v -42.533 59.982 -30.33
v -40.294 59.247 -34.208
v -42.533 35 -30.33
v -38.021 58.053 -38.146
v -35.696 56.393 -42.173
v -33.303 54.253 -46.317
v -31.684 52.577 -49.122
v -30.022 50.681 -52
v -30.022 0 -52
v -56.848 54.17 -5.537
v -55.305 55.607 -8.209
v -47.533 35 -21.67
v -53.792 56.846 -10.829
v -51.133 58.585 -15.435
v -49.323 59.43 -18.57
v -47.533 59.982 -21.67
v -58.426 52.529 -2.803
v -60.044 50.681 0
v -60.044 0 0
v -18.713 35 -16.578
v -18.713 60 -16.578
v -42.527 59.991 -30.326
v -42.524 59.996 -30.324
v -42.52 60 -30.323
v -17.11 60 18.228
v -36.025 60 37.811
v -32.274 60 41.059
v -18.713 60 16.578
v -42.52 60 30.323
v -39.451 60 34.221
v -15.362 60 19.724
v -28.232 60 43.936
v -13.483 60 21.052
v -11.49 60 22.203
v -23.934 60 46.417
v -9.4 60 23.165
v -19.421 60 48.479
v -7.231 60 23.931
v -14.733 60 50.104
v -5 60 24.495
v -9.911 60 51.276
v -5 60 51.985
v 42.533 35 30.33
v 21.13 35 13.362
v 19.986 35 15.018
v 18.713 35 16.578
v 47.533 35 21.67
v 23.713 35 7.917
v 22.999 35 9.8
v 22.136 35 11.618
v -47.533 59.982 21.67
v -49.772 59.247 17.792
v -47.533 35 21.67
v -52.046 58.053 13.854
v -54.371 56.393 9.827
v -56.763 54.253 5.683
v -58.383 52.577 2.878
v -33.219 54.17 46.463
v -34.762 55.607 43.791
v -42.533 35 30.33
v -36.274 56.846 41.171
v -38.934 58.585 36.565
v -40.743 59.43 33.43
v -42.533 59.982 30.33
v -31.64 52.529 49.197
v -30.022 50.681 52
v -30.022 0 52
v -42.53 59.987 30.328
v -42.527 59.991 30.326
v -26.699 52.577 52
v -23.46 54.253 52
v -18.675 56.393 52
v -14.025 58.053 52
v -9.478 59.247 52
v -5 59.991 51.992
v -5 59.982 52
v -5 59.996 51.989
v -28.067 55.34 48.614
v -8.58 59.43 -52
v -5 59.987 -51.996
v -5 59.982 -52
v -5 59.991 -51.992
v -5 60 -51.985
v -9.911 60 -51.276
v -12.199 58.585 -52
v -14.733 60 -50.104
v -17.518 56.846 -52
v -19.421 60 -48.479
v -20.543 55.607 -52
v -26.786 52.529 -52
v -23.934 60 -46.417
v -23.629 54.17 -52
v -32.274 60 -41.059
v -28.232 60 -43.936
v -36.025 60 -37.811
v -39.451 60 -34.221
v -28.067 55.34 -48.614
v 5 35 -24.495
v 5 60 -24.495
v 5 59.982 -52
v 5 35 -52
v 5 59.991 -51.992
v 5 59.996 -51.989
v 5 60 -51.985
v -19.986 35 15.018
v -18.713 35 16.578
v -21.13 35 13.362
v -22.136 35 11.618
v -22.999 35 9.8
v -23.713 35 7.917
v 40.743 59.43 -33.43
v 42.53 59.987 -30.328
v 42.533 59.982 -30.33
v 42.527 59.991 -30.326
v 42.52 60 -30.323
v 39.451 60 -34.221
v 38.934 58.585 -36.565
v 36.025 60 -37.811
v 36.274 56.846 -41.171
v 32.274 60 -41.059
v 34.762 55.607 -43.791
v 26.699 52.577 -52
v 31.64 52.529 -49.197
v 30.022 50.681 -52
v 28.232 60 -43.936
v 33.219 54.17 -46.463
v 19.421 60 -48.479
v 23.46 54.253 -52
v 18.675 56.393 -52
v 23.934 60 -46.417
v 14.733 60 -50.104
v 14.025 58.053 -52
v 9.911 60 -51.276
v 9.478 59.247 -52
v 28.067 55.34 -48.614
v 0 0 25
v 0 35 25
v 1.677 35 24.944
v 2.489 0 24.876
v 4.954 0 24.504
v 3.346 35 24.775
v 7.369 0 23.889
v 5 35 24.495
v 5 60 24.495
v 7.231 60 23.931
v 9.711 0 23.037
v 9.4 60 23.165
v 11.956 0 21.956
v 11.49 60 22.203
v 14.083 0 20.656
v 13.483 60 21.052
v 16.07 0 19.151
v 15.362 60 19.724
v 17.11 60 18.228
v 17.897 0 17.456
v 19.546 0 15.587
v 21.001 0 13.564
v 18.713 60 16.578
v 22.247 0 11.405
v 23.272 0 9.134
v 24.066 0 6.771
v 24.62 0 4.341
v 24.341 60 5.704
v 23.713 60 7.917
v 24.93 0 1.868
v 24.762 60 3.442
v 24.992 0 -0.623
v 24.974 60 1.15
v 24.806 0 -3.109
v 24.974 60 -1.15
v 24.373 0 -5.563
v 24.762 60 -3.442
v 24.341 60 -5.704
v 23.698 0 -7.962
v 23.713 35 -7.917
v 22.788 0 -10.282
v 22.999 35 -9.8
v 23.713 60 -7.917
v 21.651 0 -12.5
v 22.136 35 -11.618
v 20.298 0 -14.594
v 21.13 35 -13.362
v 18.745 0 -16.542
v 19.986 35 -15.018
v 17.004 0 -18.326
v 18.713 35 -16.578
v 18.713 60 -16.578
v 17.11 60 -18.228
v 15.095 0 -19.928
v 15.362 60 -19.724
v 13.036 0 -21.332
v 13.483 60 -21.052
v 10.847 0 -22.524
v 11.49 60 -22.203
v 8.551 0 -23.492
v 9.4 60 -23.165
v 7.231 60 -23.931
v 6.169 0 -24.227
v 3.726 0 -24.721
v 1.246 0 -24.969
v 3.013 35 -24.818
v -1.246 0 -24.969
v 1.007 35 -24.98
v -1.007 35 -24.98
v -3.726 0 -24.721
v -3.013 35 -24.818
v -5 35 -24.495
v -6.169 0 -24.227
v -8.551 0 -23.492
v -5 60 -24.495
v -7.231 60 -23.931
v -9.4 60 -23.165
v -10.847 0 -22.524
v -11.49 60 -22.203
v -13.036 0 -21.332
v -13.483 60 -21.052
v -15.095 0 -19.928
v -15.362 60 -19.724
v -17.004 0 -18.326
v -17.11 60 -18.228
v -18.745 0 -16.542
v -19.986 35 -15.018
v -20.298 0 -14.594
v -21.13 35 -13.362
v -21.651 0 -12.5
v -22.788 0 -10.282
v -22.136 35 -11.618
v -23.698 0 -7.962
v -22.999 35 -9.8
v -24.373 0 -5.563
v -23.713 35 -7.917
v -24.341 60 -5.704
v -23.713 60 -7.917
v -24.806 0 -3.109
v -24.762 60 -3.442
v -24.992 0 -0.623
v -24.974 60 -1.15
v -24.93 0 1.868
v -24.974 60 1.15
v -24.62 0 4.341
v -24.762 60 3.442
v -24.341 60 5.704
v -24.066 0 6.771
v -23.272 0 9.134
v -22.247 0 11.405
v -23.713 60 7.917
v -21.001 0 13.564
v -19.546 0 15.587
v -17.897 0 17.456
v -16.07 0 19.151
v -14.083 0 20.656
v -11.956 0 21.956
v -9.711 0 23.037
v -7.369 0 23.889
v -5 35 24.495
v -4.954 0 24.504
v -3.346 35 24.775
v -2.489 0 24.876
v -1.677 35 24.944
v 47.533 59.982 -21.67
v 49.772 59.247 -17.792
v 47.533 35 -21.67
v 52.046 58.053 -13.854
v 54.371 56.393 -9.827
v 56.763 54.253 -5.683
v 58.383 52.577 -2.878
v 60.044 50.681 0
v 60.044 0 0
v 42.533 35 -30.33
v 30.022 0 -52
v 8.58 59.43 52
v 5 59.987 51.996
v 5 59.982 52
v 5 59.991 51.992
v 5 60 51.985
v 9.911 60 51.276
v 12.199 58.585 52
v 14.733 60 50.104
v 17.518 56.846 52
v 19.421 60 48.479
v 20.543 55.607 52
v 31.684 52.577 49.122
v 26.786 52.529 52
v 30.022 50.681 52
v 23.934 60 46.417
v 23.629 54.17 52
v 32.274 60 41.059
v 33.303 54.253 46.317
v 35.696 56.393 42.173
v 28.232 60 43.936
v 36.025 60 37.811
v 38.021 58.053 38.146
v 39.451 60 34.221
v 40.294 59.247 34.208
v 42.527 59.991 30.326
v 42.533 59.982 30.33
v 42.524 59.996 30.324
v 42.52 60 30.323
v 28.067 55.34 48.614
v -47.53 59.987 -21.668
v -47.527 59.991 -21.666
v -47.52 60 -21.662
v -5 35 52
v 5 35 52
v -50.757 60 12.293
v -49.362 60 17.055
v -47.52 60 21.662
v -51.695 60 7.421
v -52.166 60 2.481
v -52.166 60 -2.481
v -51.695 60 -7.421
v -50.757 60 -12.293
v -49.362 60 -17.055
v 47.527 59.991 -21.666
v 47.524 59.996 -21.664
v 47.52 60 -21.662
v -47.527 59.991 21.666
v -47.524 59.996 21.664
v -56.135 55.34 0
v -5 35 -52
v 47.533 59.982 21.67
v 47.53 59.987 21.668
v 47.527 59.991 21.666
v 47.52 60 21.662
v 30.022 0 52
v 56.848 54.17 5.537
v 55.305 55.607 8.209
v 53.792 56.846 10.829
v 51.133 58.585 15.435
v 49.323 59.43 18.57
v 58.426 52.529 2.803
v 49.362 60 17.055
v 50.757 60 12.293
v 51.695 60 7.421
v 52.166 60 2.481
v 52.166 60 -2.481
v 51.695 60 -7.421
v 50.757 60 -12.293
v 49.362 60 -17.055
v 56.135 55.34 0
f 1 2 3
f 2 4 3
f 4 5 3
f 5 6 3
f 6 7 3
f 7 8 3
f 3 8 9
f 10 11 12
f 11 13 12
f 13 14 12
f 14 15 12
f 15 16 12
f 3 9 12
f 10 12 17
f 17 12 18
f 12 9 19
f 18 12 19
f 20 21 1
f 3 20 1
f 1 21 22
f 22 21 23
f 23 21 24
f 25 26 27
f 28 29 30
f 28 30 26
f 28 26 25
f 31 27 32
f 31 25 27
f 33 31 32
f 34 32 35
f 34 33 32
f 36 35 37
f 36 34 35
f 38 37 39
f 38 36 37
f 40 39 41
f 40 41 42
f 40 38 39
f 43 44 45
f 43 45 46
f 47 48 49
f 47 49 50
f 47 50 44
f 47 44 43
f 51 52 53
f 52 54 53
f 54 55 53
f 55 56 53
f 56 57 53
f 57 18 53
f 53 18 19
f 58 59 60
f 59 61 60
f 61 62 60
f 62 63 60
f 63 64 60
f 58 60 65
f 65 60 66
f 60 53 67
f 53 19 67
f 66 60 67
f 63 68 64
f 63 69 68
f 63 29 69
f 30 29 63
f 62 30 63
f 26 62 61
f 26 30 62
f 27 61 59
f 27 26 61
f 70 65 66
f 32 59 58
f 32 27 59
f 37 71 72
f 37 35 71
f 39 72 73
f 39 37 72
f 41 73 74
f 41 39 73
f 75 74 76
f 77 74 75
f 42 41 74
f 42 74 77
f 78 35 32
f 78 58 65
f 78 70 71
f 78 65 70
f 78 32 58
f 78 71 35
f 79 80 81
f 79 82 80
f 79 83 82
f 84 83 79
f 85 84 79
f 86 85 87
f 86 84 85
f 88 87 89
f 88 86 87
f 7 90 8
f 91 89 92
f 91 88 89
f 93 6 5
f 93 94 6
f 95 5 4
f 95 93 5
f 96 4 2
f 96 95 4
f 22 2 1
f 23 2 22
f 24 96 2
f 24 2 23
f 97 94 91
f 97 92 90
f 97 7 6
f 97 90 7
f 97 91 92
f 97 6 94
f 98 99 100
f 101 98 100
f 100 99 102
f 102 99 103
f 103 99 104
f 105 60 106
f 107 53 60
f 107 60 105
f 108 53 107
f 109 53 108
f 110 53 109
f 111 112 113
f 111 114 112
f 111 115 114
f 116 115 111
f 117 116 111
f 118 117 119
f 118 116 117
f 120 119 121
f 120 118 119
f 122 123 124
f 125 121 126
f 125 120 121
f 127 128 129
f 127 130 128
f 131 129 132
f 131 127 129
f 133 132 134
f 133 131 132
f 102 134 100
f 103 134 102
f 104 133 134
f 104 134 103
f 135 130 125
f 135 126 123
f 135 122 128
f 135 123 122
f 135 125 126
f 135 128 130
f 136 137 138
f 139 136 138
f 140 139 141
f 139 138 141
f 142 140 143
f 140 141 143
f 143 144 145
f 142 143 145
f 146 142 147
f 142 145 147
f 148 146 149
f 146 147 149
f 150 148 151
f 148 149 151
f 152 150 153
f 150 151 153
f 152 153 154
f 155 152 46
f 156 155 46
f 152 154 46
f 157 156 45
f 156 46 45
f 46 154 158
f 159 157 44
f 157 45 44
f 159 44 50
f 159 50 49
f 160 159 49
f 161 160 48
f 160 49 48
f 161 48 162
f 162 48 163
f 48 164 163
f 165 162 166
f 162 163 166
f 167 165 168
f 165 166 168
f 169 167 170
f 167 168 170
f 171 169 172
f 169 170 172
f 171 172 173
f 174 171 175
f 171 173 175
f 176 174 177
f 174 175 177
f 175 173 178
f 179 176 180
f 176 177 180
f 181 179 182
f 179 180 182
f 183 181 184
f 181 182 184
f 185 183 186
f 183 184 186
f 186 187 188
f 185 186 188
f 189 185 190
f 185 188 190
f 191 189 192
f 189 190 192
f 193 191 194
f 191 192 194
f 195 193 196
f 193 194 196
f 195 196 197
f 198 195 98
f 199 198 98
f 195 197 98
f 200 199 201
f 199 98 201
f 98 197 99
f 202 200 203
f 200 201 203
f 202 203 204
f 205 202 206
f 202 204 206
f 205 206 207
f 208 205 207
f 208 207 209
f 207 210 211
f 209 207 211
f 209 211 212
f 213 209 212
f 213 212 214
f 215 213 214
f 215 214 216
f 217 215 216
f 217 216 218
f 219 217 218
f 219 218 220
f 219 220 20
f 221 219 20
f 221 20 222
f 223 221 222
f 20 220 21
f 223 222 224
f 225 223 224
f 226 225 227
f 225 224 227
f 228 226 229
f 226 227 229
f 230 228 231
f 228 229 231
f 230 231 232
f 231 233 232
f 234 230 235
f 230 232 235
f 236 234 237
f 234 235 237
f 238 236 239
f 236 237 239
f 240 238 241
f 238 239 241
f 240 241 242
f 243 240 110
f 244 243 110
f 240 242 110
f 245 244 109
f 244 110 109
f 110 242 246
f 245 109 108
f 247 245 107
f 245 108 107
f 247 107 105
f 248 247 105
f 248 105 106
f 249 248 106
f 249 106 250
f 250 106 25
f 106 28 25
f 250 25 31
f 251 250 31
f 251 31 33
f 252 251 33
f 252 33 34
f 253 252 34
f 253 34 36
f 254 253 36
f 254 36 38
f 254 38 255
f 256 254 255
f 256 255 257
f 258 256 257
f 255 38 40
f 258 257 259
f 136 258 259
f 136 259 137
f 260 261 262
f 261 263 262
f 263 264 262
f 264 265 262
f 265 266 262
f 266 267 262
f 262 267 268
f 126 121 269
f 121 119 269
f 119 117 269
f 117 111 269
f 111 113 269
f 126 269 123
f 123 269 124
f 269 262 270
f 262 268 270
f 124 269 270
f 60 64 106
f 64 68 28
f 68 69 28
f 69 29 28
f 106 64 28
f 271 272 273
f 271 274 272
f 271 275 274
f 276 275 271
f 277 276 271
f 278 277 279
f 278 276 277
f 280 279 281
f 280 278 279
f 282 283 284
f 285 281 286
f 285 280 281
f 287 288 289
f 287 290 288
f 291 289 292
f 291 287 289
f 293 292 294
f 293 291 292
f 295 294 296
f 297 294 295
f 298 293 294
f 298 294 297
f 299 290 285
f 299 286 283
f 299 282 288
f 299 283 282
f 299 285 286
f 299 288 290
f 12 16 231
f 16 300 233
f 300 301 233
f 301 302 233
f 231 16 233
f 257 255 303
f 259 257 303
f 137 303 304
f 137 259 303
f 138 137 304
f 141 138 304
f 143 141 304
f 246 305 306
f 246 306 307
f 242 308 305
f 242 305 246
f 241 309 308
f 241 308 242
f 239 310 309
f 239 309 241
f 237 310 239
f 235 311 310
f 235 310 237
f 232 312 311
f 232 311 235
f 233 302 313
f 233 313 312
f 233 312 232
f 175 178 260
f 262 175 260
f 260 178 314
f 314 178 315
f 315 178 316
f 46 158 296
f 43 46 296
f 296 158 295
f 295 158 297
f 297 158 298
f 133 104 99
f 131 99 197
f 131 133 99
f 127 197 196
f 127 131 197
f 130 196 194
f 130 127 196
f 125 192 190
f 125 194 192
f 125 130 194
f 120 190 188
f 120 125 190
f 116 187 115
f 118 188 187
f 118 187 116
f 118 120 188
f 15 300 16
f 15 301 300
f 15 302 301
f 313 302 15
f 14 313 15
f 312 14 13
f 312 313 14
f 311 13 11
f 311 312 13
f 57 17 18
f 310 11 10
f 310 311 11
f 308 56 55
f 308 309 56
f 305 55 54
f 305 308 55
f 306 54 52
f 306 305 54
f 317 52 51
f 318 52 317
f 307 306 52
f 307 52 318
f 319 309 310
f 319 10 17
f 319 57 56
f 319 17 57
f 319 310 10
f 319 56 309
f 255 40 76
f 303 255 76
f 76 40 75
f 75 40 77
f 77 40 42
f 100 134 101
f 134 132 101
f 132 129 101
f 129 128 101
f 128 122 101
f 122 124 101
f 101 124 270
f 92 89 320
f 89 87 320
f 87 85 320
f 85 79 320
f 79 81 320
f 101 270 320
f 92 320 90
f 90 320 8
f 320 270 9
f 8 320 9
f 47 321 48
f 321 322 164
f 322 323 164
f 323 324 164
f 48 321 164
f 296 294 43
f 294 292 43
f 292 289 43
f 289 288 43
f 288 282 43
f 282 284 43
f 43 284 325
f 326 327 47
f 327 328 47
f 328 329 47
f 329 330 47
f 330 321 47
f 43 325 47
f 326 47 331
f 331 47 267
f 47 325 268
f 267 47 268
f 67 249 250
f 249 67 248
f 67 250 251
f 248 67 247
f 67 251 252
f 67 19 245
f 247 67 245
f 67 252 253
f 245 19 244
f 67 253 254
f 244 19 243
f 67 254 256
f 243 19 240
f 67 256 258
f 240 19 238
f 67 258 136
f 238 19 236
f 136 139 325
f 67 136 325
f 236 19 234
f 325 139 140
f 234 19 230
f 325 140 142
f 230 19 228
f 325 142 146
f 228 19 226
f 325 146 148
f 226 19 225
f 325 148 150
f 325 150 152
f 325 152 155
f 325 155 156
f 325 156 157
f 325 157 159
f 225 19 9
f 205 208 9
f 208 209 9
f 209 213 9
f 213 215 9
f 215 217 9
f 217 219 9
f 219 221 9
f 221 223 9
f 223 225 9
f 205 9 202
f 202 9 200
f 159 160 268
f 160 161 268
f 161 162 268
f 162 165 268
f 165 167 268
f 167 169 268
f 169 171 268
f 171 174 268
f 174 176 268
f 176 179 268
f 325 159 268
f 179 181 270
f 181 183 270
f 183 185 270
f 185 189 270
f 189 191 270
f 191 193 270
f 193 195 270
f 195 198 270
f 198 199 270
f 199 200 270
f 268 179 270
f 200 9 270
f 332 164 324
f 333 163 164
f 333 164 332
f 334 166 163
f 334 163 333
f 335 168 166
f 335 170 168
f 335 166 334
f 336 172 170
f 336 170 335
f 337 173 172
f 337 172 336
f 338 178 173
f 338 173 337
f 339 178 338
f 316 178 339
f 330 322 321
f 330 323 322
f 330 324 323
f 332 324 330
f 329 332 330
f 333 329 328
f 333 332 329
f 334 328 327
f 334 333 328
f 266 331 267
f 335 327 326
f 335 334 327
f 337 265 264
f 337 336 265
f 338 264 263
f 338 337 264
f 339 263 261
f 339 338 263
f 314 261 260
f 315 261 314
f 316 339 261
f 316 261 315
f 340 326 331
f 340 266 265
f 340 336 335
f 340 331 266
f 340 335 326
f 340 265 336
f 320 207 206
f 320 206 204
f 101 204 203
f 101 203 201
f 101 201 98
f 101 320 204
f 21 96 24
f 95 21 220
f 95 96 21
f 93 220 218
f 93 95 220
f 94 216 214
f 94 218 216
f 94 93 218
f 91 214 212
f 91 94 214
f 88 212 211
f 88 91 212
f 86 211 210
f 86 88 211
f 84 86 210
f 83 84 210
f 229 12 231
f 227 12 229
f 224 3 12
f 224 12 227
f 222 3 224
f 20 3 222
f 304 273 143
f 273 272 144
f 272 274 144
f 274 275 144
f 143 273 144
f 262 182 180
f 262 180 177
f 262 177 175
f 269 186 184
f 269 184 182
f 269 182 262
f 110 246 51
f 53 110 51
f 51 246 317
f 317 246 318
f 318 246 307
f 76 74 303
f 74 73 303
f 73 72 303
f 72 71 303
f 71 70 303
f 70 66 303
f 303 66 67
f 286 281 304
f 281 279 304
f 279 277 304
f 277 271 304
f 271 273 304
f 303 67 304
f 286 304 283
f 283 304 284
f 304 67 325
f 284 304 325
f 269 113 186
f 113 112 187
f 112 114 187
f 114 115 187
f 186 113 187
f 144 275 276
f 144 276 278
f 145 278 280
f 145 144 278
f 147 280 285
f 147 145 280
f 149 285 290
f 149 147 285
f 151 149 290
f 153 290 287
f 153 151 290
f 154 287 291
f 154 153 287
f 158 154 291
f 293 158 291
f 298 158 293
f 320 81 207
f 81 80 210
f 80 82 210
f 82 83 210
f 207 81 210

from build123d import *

# Parameters (mm, degrees)
BOSS_EXTRUDE1_DEPTH = 60
CUT_EXTRUDE9_DEPTH  = 25
SKETCH5_OUTSIDE_W   = 324.786
SKETCH5_OUTSIDE_H   = 308.698
SKETCH5_OUTSIDE_R   = 52.224812322
CUT_EXTRUDE10_DEPTH = 100.545634426
CUT_EXTRUDE10_DRAFT = -40
SKETCH6_R           = 25
CUT_EXTRUDE11_DEPTH = 100.545634426


with BuildPart() as part:
    # Sketch1 → Boss-Extrude1 (new body)
    with BuildSketch(Plane(origin=(0, 0, 0), x_dir=(1, 0, 0), z_dir=(0, 1, 0))):
        Polygon((30.022213998, -52), (60.044427996, 0), (30.022213998, 52), (-30.022213998, 52), (-60.044427996, 0), (-30.022213998, -52), align=None)
    extrude(amount=BOSS_EXTRUDE1_DEPTH)

    # Sketch2 → Cut-Extrude9 (cut)
    with BuildSketch(Plane(origin=(0, 60, 0), x_dir=(1, 0, 0), z_dir=(0, 1, 0))):
        with BuildLine():
            Line((5, 52), (-5, 52))
            Line((-5, 52), (-5, 24.494897428))
            ThreePointArc((-5, 24.494897428), (0, 25), (5, 24.494897428))
            Line((5, 24.494897428), (5, 52))
        make_face()
        with BuildLine():
            ThreePointArc((5, -24.494897428), (0, -25), (-5, -24.494897428))
            Line((-5, -24.494897428), (-5, -52))
            Line((-5, -52), (5, -52))
            Line((5, -52), (5, -24.494897428))
        make_face()
        with BuildLine():
            Line((42.533320997, 30.330127019), (18.713203436, 16.577575733))
            ThreePointArc((18.713203436, 16.577575733), (21.650635095, 12.5), (23.713203436, 7.917321695))
            Line((23.713203436, 7.917321695), (47.533320997, 21.669872981))
            Line((47.533320997, 21.669872981), (42.533320997, 30.330127019))
        make_face()
        with BuildLine():
            ThreePointArc((-23.713203436, 7.917321695), (-21.650635095, 12.5), (-18.713203436, 16.577575733))
            Line((-18.713203436, 16.577575733), (-42.533320997, 30.330127019))
            Line((-42.533320997, 30.330127019), (-47.533320997, 21.669872981))
            Line((-47.533320997, 21.669872981), (-23.713203436, 7.917321695))
        make_face()
        with BuildLine():
            ThreePointArc((-18.713203436, -16.577575733), (-21.650635095, -12.5), (-23.713203436, -7.917321695))
            Line((-23.713203436, -7.917321695), (-47.533320997, -21.669872981))
            Line((-47.533320997, -21.669872981), (-42.533320997, -30.330127019))
            Line((-42.533320997, -30.330127019), (-18.713203436, -16.577575733))
        make_face()
        with BuildLine():
            Line((47.533320997, -21.669872981), (23.713203436, -7.917321695))
            ThreePointArc((23.713203436, -7.917321695), (21.650635095, -12.5), (18.713203436, -16.577575733))
            Line((18.713203436, -16.577575733), (42.533320997, -30.330127019))
            Line((42.533320997, -30.330127019), (47.533320997, -21.669872981))
        make_face()
    extrude(amount=-CUT_EXTRUDE9_DEPTH, mode=Mode.SUBTRACT)


with BuildPart() as cut_extrude10_tool:
    # Sketch5 outside → Cut-Extrude10 (with draft: the straight prism first)
    with BuildSketch(Plane(origin=(0, 60, 0), x_dir=(1, 0, 0), z_dir=(0, 1, 0))):
        Rectangle(SKETCH5_OUTSIDE_W, SKETCH5_OUTSIDE_H)
        Circle(SKETCH5_OUTSIDE_R, mode=Mode.SUBTRACT)
    extrude(amount=-CUT_EXTRUDE10_DEPTH)
    # Cut-Extrude10: the draft: its side faces are tilted about the plane it starts from
    cut_extrude10_sides = [cut_extrude10_tool.faces().sort_by_distance(p)[0] for p in [
        (0, 9.727182787, 154.349),
        (162.393, 9.727182787, 0),
        (0, 9.727182787, -154.349),
        (-162.393, 9.727182787, 0),
        (-52.224812322, 9.727182787, 0),
    ]]
    draft(cut_extrude10_sides, Plane(origin=(0, 60, 0), x_dir=(1, 0, 0), z_dir=(0, 1, 0)), CUT_EXTRUDE10_DRAFT)


with BuildPart() as part_1:
    add(part.part)

    # Cut-Extrude10: cut by cut_extrude10_tool
    add(cut_extrude10_tool.part, mode=Mode.SUBTRACT)

    # Sketch6 → Cut-Extrude11 (cut, through all)
    with BuildSketch(Plane(origin=(0, 60, 0), x_dir=(1, 0, 0), z_dir=(0, 1, 0))):
        with Locations(Location((0, 0, 0), (0, 0, 270))):
            Circle(SKETCH6_R)
    extrude(amount=-CUT_EXTRUDE11_DEPTH, mode=Mode.SUBTRACT)


solid = part_1.part
